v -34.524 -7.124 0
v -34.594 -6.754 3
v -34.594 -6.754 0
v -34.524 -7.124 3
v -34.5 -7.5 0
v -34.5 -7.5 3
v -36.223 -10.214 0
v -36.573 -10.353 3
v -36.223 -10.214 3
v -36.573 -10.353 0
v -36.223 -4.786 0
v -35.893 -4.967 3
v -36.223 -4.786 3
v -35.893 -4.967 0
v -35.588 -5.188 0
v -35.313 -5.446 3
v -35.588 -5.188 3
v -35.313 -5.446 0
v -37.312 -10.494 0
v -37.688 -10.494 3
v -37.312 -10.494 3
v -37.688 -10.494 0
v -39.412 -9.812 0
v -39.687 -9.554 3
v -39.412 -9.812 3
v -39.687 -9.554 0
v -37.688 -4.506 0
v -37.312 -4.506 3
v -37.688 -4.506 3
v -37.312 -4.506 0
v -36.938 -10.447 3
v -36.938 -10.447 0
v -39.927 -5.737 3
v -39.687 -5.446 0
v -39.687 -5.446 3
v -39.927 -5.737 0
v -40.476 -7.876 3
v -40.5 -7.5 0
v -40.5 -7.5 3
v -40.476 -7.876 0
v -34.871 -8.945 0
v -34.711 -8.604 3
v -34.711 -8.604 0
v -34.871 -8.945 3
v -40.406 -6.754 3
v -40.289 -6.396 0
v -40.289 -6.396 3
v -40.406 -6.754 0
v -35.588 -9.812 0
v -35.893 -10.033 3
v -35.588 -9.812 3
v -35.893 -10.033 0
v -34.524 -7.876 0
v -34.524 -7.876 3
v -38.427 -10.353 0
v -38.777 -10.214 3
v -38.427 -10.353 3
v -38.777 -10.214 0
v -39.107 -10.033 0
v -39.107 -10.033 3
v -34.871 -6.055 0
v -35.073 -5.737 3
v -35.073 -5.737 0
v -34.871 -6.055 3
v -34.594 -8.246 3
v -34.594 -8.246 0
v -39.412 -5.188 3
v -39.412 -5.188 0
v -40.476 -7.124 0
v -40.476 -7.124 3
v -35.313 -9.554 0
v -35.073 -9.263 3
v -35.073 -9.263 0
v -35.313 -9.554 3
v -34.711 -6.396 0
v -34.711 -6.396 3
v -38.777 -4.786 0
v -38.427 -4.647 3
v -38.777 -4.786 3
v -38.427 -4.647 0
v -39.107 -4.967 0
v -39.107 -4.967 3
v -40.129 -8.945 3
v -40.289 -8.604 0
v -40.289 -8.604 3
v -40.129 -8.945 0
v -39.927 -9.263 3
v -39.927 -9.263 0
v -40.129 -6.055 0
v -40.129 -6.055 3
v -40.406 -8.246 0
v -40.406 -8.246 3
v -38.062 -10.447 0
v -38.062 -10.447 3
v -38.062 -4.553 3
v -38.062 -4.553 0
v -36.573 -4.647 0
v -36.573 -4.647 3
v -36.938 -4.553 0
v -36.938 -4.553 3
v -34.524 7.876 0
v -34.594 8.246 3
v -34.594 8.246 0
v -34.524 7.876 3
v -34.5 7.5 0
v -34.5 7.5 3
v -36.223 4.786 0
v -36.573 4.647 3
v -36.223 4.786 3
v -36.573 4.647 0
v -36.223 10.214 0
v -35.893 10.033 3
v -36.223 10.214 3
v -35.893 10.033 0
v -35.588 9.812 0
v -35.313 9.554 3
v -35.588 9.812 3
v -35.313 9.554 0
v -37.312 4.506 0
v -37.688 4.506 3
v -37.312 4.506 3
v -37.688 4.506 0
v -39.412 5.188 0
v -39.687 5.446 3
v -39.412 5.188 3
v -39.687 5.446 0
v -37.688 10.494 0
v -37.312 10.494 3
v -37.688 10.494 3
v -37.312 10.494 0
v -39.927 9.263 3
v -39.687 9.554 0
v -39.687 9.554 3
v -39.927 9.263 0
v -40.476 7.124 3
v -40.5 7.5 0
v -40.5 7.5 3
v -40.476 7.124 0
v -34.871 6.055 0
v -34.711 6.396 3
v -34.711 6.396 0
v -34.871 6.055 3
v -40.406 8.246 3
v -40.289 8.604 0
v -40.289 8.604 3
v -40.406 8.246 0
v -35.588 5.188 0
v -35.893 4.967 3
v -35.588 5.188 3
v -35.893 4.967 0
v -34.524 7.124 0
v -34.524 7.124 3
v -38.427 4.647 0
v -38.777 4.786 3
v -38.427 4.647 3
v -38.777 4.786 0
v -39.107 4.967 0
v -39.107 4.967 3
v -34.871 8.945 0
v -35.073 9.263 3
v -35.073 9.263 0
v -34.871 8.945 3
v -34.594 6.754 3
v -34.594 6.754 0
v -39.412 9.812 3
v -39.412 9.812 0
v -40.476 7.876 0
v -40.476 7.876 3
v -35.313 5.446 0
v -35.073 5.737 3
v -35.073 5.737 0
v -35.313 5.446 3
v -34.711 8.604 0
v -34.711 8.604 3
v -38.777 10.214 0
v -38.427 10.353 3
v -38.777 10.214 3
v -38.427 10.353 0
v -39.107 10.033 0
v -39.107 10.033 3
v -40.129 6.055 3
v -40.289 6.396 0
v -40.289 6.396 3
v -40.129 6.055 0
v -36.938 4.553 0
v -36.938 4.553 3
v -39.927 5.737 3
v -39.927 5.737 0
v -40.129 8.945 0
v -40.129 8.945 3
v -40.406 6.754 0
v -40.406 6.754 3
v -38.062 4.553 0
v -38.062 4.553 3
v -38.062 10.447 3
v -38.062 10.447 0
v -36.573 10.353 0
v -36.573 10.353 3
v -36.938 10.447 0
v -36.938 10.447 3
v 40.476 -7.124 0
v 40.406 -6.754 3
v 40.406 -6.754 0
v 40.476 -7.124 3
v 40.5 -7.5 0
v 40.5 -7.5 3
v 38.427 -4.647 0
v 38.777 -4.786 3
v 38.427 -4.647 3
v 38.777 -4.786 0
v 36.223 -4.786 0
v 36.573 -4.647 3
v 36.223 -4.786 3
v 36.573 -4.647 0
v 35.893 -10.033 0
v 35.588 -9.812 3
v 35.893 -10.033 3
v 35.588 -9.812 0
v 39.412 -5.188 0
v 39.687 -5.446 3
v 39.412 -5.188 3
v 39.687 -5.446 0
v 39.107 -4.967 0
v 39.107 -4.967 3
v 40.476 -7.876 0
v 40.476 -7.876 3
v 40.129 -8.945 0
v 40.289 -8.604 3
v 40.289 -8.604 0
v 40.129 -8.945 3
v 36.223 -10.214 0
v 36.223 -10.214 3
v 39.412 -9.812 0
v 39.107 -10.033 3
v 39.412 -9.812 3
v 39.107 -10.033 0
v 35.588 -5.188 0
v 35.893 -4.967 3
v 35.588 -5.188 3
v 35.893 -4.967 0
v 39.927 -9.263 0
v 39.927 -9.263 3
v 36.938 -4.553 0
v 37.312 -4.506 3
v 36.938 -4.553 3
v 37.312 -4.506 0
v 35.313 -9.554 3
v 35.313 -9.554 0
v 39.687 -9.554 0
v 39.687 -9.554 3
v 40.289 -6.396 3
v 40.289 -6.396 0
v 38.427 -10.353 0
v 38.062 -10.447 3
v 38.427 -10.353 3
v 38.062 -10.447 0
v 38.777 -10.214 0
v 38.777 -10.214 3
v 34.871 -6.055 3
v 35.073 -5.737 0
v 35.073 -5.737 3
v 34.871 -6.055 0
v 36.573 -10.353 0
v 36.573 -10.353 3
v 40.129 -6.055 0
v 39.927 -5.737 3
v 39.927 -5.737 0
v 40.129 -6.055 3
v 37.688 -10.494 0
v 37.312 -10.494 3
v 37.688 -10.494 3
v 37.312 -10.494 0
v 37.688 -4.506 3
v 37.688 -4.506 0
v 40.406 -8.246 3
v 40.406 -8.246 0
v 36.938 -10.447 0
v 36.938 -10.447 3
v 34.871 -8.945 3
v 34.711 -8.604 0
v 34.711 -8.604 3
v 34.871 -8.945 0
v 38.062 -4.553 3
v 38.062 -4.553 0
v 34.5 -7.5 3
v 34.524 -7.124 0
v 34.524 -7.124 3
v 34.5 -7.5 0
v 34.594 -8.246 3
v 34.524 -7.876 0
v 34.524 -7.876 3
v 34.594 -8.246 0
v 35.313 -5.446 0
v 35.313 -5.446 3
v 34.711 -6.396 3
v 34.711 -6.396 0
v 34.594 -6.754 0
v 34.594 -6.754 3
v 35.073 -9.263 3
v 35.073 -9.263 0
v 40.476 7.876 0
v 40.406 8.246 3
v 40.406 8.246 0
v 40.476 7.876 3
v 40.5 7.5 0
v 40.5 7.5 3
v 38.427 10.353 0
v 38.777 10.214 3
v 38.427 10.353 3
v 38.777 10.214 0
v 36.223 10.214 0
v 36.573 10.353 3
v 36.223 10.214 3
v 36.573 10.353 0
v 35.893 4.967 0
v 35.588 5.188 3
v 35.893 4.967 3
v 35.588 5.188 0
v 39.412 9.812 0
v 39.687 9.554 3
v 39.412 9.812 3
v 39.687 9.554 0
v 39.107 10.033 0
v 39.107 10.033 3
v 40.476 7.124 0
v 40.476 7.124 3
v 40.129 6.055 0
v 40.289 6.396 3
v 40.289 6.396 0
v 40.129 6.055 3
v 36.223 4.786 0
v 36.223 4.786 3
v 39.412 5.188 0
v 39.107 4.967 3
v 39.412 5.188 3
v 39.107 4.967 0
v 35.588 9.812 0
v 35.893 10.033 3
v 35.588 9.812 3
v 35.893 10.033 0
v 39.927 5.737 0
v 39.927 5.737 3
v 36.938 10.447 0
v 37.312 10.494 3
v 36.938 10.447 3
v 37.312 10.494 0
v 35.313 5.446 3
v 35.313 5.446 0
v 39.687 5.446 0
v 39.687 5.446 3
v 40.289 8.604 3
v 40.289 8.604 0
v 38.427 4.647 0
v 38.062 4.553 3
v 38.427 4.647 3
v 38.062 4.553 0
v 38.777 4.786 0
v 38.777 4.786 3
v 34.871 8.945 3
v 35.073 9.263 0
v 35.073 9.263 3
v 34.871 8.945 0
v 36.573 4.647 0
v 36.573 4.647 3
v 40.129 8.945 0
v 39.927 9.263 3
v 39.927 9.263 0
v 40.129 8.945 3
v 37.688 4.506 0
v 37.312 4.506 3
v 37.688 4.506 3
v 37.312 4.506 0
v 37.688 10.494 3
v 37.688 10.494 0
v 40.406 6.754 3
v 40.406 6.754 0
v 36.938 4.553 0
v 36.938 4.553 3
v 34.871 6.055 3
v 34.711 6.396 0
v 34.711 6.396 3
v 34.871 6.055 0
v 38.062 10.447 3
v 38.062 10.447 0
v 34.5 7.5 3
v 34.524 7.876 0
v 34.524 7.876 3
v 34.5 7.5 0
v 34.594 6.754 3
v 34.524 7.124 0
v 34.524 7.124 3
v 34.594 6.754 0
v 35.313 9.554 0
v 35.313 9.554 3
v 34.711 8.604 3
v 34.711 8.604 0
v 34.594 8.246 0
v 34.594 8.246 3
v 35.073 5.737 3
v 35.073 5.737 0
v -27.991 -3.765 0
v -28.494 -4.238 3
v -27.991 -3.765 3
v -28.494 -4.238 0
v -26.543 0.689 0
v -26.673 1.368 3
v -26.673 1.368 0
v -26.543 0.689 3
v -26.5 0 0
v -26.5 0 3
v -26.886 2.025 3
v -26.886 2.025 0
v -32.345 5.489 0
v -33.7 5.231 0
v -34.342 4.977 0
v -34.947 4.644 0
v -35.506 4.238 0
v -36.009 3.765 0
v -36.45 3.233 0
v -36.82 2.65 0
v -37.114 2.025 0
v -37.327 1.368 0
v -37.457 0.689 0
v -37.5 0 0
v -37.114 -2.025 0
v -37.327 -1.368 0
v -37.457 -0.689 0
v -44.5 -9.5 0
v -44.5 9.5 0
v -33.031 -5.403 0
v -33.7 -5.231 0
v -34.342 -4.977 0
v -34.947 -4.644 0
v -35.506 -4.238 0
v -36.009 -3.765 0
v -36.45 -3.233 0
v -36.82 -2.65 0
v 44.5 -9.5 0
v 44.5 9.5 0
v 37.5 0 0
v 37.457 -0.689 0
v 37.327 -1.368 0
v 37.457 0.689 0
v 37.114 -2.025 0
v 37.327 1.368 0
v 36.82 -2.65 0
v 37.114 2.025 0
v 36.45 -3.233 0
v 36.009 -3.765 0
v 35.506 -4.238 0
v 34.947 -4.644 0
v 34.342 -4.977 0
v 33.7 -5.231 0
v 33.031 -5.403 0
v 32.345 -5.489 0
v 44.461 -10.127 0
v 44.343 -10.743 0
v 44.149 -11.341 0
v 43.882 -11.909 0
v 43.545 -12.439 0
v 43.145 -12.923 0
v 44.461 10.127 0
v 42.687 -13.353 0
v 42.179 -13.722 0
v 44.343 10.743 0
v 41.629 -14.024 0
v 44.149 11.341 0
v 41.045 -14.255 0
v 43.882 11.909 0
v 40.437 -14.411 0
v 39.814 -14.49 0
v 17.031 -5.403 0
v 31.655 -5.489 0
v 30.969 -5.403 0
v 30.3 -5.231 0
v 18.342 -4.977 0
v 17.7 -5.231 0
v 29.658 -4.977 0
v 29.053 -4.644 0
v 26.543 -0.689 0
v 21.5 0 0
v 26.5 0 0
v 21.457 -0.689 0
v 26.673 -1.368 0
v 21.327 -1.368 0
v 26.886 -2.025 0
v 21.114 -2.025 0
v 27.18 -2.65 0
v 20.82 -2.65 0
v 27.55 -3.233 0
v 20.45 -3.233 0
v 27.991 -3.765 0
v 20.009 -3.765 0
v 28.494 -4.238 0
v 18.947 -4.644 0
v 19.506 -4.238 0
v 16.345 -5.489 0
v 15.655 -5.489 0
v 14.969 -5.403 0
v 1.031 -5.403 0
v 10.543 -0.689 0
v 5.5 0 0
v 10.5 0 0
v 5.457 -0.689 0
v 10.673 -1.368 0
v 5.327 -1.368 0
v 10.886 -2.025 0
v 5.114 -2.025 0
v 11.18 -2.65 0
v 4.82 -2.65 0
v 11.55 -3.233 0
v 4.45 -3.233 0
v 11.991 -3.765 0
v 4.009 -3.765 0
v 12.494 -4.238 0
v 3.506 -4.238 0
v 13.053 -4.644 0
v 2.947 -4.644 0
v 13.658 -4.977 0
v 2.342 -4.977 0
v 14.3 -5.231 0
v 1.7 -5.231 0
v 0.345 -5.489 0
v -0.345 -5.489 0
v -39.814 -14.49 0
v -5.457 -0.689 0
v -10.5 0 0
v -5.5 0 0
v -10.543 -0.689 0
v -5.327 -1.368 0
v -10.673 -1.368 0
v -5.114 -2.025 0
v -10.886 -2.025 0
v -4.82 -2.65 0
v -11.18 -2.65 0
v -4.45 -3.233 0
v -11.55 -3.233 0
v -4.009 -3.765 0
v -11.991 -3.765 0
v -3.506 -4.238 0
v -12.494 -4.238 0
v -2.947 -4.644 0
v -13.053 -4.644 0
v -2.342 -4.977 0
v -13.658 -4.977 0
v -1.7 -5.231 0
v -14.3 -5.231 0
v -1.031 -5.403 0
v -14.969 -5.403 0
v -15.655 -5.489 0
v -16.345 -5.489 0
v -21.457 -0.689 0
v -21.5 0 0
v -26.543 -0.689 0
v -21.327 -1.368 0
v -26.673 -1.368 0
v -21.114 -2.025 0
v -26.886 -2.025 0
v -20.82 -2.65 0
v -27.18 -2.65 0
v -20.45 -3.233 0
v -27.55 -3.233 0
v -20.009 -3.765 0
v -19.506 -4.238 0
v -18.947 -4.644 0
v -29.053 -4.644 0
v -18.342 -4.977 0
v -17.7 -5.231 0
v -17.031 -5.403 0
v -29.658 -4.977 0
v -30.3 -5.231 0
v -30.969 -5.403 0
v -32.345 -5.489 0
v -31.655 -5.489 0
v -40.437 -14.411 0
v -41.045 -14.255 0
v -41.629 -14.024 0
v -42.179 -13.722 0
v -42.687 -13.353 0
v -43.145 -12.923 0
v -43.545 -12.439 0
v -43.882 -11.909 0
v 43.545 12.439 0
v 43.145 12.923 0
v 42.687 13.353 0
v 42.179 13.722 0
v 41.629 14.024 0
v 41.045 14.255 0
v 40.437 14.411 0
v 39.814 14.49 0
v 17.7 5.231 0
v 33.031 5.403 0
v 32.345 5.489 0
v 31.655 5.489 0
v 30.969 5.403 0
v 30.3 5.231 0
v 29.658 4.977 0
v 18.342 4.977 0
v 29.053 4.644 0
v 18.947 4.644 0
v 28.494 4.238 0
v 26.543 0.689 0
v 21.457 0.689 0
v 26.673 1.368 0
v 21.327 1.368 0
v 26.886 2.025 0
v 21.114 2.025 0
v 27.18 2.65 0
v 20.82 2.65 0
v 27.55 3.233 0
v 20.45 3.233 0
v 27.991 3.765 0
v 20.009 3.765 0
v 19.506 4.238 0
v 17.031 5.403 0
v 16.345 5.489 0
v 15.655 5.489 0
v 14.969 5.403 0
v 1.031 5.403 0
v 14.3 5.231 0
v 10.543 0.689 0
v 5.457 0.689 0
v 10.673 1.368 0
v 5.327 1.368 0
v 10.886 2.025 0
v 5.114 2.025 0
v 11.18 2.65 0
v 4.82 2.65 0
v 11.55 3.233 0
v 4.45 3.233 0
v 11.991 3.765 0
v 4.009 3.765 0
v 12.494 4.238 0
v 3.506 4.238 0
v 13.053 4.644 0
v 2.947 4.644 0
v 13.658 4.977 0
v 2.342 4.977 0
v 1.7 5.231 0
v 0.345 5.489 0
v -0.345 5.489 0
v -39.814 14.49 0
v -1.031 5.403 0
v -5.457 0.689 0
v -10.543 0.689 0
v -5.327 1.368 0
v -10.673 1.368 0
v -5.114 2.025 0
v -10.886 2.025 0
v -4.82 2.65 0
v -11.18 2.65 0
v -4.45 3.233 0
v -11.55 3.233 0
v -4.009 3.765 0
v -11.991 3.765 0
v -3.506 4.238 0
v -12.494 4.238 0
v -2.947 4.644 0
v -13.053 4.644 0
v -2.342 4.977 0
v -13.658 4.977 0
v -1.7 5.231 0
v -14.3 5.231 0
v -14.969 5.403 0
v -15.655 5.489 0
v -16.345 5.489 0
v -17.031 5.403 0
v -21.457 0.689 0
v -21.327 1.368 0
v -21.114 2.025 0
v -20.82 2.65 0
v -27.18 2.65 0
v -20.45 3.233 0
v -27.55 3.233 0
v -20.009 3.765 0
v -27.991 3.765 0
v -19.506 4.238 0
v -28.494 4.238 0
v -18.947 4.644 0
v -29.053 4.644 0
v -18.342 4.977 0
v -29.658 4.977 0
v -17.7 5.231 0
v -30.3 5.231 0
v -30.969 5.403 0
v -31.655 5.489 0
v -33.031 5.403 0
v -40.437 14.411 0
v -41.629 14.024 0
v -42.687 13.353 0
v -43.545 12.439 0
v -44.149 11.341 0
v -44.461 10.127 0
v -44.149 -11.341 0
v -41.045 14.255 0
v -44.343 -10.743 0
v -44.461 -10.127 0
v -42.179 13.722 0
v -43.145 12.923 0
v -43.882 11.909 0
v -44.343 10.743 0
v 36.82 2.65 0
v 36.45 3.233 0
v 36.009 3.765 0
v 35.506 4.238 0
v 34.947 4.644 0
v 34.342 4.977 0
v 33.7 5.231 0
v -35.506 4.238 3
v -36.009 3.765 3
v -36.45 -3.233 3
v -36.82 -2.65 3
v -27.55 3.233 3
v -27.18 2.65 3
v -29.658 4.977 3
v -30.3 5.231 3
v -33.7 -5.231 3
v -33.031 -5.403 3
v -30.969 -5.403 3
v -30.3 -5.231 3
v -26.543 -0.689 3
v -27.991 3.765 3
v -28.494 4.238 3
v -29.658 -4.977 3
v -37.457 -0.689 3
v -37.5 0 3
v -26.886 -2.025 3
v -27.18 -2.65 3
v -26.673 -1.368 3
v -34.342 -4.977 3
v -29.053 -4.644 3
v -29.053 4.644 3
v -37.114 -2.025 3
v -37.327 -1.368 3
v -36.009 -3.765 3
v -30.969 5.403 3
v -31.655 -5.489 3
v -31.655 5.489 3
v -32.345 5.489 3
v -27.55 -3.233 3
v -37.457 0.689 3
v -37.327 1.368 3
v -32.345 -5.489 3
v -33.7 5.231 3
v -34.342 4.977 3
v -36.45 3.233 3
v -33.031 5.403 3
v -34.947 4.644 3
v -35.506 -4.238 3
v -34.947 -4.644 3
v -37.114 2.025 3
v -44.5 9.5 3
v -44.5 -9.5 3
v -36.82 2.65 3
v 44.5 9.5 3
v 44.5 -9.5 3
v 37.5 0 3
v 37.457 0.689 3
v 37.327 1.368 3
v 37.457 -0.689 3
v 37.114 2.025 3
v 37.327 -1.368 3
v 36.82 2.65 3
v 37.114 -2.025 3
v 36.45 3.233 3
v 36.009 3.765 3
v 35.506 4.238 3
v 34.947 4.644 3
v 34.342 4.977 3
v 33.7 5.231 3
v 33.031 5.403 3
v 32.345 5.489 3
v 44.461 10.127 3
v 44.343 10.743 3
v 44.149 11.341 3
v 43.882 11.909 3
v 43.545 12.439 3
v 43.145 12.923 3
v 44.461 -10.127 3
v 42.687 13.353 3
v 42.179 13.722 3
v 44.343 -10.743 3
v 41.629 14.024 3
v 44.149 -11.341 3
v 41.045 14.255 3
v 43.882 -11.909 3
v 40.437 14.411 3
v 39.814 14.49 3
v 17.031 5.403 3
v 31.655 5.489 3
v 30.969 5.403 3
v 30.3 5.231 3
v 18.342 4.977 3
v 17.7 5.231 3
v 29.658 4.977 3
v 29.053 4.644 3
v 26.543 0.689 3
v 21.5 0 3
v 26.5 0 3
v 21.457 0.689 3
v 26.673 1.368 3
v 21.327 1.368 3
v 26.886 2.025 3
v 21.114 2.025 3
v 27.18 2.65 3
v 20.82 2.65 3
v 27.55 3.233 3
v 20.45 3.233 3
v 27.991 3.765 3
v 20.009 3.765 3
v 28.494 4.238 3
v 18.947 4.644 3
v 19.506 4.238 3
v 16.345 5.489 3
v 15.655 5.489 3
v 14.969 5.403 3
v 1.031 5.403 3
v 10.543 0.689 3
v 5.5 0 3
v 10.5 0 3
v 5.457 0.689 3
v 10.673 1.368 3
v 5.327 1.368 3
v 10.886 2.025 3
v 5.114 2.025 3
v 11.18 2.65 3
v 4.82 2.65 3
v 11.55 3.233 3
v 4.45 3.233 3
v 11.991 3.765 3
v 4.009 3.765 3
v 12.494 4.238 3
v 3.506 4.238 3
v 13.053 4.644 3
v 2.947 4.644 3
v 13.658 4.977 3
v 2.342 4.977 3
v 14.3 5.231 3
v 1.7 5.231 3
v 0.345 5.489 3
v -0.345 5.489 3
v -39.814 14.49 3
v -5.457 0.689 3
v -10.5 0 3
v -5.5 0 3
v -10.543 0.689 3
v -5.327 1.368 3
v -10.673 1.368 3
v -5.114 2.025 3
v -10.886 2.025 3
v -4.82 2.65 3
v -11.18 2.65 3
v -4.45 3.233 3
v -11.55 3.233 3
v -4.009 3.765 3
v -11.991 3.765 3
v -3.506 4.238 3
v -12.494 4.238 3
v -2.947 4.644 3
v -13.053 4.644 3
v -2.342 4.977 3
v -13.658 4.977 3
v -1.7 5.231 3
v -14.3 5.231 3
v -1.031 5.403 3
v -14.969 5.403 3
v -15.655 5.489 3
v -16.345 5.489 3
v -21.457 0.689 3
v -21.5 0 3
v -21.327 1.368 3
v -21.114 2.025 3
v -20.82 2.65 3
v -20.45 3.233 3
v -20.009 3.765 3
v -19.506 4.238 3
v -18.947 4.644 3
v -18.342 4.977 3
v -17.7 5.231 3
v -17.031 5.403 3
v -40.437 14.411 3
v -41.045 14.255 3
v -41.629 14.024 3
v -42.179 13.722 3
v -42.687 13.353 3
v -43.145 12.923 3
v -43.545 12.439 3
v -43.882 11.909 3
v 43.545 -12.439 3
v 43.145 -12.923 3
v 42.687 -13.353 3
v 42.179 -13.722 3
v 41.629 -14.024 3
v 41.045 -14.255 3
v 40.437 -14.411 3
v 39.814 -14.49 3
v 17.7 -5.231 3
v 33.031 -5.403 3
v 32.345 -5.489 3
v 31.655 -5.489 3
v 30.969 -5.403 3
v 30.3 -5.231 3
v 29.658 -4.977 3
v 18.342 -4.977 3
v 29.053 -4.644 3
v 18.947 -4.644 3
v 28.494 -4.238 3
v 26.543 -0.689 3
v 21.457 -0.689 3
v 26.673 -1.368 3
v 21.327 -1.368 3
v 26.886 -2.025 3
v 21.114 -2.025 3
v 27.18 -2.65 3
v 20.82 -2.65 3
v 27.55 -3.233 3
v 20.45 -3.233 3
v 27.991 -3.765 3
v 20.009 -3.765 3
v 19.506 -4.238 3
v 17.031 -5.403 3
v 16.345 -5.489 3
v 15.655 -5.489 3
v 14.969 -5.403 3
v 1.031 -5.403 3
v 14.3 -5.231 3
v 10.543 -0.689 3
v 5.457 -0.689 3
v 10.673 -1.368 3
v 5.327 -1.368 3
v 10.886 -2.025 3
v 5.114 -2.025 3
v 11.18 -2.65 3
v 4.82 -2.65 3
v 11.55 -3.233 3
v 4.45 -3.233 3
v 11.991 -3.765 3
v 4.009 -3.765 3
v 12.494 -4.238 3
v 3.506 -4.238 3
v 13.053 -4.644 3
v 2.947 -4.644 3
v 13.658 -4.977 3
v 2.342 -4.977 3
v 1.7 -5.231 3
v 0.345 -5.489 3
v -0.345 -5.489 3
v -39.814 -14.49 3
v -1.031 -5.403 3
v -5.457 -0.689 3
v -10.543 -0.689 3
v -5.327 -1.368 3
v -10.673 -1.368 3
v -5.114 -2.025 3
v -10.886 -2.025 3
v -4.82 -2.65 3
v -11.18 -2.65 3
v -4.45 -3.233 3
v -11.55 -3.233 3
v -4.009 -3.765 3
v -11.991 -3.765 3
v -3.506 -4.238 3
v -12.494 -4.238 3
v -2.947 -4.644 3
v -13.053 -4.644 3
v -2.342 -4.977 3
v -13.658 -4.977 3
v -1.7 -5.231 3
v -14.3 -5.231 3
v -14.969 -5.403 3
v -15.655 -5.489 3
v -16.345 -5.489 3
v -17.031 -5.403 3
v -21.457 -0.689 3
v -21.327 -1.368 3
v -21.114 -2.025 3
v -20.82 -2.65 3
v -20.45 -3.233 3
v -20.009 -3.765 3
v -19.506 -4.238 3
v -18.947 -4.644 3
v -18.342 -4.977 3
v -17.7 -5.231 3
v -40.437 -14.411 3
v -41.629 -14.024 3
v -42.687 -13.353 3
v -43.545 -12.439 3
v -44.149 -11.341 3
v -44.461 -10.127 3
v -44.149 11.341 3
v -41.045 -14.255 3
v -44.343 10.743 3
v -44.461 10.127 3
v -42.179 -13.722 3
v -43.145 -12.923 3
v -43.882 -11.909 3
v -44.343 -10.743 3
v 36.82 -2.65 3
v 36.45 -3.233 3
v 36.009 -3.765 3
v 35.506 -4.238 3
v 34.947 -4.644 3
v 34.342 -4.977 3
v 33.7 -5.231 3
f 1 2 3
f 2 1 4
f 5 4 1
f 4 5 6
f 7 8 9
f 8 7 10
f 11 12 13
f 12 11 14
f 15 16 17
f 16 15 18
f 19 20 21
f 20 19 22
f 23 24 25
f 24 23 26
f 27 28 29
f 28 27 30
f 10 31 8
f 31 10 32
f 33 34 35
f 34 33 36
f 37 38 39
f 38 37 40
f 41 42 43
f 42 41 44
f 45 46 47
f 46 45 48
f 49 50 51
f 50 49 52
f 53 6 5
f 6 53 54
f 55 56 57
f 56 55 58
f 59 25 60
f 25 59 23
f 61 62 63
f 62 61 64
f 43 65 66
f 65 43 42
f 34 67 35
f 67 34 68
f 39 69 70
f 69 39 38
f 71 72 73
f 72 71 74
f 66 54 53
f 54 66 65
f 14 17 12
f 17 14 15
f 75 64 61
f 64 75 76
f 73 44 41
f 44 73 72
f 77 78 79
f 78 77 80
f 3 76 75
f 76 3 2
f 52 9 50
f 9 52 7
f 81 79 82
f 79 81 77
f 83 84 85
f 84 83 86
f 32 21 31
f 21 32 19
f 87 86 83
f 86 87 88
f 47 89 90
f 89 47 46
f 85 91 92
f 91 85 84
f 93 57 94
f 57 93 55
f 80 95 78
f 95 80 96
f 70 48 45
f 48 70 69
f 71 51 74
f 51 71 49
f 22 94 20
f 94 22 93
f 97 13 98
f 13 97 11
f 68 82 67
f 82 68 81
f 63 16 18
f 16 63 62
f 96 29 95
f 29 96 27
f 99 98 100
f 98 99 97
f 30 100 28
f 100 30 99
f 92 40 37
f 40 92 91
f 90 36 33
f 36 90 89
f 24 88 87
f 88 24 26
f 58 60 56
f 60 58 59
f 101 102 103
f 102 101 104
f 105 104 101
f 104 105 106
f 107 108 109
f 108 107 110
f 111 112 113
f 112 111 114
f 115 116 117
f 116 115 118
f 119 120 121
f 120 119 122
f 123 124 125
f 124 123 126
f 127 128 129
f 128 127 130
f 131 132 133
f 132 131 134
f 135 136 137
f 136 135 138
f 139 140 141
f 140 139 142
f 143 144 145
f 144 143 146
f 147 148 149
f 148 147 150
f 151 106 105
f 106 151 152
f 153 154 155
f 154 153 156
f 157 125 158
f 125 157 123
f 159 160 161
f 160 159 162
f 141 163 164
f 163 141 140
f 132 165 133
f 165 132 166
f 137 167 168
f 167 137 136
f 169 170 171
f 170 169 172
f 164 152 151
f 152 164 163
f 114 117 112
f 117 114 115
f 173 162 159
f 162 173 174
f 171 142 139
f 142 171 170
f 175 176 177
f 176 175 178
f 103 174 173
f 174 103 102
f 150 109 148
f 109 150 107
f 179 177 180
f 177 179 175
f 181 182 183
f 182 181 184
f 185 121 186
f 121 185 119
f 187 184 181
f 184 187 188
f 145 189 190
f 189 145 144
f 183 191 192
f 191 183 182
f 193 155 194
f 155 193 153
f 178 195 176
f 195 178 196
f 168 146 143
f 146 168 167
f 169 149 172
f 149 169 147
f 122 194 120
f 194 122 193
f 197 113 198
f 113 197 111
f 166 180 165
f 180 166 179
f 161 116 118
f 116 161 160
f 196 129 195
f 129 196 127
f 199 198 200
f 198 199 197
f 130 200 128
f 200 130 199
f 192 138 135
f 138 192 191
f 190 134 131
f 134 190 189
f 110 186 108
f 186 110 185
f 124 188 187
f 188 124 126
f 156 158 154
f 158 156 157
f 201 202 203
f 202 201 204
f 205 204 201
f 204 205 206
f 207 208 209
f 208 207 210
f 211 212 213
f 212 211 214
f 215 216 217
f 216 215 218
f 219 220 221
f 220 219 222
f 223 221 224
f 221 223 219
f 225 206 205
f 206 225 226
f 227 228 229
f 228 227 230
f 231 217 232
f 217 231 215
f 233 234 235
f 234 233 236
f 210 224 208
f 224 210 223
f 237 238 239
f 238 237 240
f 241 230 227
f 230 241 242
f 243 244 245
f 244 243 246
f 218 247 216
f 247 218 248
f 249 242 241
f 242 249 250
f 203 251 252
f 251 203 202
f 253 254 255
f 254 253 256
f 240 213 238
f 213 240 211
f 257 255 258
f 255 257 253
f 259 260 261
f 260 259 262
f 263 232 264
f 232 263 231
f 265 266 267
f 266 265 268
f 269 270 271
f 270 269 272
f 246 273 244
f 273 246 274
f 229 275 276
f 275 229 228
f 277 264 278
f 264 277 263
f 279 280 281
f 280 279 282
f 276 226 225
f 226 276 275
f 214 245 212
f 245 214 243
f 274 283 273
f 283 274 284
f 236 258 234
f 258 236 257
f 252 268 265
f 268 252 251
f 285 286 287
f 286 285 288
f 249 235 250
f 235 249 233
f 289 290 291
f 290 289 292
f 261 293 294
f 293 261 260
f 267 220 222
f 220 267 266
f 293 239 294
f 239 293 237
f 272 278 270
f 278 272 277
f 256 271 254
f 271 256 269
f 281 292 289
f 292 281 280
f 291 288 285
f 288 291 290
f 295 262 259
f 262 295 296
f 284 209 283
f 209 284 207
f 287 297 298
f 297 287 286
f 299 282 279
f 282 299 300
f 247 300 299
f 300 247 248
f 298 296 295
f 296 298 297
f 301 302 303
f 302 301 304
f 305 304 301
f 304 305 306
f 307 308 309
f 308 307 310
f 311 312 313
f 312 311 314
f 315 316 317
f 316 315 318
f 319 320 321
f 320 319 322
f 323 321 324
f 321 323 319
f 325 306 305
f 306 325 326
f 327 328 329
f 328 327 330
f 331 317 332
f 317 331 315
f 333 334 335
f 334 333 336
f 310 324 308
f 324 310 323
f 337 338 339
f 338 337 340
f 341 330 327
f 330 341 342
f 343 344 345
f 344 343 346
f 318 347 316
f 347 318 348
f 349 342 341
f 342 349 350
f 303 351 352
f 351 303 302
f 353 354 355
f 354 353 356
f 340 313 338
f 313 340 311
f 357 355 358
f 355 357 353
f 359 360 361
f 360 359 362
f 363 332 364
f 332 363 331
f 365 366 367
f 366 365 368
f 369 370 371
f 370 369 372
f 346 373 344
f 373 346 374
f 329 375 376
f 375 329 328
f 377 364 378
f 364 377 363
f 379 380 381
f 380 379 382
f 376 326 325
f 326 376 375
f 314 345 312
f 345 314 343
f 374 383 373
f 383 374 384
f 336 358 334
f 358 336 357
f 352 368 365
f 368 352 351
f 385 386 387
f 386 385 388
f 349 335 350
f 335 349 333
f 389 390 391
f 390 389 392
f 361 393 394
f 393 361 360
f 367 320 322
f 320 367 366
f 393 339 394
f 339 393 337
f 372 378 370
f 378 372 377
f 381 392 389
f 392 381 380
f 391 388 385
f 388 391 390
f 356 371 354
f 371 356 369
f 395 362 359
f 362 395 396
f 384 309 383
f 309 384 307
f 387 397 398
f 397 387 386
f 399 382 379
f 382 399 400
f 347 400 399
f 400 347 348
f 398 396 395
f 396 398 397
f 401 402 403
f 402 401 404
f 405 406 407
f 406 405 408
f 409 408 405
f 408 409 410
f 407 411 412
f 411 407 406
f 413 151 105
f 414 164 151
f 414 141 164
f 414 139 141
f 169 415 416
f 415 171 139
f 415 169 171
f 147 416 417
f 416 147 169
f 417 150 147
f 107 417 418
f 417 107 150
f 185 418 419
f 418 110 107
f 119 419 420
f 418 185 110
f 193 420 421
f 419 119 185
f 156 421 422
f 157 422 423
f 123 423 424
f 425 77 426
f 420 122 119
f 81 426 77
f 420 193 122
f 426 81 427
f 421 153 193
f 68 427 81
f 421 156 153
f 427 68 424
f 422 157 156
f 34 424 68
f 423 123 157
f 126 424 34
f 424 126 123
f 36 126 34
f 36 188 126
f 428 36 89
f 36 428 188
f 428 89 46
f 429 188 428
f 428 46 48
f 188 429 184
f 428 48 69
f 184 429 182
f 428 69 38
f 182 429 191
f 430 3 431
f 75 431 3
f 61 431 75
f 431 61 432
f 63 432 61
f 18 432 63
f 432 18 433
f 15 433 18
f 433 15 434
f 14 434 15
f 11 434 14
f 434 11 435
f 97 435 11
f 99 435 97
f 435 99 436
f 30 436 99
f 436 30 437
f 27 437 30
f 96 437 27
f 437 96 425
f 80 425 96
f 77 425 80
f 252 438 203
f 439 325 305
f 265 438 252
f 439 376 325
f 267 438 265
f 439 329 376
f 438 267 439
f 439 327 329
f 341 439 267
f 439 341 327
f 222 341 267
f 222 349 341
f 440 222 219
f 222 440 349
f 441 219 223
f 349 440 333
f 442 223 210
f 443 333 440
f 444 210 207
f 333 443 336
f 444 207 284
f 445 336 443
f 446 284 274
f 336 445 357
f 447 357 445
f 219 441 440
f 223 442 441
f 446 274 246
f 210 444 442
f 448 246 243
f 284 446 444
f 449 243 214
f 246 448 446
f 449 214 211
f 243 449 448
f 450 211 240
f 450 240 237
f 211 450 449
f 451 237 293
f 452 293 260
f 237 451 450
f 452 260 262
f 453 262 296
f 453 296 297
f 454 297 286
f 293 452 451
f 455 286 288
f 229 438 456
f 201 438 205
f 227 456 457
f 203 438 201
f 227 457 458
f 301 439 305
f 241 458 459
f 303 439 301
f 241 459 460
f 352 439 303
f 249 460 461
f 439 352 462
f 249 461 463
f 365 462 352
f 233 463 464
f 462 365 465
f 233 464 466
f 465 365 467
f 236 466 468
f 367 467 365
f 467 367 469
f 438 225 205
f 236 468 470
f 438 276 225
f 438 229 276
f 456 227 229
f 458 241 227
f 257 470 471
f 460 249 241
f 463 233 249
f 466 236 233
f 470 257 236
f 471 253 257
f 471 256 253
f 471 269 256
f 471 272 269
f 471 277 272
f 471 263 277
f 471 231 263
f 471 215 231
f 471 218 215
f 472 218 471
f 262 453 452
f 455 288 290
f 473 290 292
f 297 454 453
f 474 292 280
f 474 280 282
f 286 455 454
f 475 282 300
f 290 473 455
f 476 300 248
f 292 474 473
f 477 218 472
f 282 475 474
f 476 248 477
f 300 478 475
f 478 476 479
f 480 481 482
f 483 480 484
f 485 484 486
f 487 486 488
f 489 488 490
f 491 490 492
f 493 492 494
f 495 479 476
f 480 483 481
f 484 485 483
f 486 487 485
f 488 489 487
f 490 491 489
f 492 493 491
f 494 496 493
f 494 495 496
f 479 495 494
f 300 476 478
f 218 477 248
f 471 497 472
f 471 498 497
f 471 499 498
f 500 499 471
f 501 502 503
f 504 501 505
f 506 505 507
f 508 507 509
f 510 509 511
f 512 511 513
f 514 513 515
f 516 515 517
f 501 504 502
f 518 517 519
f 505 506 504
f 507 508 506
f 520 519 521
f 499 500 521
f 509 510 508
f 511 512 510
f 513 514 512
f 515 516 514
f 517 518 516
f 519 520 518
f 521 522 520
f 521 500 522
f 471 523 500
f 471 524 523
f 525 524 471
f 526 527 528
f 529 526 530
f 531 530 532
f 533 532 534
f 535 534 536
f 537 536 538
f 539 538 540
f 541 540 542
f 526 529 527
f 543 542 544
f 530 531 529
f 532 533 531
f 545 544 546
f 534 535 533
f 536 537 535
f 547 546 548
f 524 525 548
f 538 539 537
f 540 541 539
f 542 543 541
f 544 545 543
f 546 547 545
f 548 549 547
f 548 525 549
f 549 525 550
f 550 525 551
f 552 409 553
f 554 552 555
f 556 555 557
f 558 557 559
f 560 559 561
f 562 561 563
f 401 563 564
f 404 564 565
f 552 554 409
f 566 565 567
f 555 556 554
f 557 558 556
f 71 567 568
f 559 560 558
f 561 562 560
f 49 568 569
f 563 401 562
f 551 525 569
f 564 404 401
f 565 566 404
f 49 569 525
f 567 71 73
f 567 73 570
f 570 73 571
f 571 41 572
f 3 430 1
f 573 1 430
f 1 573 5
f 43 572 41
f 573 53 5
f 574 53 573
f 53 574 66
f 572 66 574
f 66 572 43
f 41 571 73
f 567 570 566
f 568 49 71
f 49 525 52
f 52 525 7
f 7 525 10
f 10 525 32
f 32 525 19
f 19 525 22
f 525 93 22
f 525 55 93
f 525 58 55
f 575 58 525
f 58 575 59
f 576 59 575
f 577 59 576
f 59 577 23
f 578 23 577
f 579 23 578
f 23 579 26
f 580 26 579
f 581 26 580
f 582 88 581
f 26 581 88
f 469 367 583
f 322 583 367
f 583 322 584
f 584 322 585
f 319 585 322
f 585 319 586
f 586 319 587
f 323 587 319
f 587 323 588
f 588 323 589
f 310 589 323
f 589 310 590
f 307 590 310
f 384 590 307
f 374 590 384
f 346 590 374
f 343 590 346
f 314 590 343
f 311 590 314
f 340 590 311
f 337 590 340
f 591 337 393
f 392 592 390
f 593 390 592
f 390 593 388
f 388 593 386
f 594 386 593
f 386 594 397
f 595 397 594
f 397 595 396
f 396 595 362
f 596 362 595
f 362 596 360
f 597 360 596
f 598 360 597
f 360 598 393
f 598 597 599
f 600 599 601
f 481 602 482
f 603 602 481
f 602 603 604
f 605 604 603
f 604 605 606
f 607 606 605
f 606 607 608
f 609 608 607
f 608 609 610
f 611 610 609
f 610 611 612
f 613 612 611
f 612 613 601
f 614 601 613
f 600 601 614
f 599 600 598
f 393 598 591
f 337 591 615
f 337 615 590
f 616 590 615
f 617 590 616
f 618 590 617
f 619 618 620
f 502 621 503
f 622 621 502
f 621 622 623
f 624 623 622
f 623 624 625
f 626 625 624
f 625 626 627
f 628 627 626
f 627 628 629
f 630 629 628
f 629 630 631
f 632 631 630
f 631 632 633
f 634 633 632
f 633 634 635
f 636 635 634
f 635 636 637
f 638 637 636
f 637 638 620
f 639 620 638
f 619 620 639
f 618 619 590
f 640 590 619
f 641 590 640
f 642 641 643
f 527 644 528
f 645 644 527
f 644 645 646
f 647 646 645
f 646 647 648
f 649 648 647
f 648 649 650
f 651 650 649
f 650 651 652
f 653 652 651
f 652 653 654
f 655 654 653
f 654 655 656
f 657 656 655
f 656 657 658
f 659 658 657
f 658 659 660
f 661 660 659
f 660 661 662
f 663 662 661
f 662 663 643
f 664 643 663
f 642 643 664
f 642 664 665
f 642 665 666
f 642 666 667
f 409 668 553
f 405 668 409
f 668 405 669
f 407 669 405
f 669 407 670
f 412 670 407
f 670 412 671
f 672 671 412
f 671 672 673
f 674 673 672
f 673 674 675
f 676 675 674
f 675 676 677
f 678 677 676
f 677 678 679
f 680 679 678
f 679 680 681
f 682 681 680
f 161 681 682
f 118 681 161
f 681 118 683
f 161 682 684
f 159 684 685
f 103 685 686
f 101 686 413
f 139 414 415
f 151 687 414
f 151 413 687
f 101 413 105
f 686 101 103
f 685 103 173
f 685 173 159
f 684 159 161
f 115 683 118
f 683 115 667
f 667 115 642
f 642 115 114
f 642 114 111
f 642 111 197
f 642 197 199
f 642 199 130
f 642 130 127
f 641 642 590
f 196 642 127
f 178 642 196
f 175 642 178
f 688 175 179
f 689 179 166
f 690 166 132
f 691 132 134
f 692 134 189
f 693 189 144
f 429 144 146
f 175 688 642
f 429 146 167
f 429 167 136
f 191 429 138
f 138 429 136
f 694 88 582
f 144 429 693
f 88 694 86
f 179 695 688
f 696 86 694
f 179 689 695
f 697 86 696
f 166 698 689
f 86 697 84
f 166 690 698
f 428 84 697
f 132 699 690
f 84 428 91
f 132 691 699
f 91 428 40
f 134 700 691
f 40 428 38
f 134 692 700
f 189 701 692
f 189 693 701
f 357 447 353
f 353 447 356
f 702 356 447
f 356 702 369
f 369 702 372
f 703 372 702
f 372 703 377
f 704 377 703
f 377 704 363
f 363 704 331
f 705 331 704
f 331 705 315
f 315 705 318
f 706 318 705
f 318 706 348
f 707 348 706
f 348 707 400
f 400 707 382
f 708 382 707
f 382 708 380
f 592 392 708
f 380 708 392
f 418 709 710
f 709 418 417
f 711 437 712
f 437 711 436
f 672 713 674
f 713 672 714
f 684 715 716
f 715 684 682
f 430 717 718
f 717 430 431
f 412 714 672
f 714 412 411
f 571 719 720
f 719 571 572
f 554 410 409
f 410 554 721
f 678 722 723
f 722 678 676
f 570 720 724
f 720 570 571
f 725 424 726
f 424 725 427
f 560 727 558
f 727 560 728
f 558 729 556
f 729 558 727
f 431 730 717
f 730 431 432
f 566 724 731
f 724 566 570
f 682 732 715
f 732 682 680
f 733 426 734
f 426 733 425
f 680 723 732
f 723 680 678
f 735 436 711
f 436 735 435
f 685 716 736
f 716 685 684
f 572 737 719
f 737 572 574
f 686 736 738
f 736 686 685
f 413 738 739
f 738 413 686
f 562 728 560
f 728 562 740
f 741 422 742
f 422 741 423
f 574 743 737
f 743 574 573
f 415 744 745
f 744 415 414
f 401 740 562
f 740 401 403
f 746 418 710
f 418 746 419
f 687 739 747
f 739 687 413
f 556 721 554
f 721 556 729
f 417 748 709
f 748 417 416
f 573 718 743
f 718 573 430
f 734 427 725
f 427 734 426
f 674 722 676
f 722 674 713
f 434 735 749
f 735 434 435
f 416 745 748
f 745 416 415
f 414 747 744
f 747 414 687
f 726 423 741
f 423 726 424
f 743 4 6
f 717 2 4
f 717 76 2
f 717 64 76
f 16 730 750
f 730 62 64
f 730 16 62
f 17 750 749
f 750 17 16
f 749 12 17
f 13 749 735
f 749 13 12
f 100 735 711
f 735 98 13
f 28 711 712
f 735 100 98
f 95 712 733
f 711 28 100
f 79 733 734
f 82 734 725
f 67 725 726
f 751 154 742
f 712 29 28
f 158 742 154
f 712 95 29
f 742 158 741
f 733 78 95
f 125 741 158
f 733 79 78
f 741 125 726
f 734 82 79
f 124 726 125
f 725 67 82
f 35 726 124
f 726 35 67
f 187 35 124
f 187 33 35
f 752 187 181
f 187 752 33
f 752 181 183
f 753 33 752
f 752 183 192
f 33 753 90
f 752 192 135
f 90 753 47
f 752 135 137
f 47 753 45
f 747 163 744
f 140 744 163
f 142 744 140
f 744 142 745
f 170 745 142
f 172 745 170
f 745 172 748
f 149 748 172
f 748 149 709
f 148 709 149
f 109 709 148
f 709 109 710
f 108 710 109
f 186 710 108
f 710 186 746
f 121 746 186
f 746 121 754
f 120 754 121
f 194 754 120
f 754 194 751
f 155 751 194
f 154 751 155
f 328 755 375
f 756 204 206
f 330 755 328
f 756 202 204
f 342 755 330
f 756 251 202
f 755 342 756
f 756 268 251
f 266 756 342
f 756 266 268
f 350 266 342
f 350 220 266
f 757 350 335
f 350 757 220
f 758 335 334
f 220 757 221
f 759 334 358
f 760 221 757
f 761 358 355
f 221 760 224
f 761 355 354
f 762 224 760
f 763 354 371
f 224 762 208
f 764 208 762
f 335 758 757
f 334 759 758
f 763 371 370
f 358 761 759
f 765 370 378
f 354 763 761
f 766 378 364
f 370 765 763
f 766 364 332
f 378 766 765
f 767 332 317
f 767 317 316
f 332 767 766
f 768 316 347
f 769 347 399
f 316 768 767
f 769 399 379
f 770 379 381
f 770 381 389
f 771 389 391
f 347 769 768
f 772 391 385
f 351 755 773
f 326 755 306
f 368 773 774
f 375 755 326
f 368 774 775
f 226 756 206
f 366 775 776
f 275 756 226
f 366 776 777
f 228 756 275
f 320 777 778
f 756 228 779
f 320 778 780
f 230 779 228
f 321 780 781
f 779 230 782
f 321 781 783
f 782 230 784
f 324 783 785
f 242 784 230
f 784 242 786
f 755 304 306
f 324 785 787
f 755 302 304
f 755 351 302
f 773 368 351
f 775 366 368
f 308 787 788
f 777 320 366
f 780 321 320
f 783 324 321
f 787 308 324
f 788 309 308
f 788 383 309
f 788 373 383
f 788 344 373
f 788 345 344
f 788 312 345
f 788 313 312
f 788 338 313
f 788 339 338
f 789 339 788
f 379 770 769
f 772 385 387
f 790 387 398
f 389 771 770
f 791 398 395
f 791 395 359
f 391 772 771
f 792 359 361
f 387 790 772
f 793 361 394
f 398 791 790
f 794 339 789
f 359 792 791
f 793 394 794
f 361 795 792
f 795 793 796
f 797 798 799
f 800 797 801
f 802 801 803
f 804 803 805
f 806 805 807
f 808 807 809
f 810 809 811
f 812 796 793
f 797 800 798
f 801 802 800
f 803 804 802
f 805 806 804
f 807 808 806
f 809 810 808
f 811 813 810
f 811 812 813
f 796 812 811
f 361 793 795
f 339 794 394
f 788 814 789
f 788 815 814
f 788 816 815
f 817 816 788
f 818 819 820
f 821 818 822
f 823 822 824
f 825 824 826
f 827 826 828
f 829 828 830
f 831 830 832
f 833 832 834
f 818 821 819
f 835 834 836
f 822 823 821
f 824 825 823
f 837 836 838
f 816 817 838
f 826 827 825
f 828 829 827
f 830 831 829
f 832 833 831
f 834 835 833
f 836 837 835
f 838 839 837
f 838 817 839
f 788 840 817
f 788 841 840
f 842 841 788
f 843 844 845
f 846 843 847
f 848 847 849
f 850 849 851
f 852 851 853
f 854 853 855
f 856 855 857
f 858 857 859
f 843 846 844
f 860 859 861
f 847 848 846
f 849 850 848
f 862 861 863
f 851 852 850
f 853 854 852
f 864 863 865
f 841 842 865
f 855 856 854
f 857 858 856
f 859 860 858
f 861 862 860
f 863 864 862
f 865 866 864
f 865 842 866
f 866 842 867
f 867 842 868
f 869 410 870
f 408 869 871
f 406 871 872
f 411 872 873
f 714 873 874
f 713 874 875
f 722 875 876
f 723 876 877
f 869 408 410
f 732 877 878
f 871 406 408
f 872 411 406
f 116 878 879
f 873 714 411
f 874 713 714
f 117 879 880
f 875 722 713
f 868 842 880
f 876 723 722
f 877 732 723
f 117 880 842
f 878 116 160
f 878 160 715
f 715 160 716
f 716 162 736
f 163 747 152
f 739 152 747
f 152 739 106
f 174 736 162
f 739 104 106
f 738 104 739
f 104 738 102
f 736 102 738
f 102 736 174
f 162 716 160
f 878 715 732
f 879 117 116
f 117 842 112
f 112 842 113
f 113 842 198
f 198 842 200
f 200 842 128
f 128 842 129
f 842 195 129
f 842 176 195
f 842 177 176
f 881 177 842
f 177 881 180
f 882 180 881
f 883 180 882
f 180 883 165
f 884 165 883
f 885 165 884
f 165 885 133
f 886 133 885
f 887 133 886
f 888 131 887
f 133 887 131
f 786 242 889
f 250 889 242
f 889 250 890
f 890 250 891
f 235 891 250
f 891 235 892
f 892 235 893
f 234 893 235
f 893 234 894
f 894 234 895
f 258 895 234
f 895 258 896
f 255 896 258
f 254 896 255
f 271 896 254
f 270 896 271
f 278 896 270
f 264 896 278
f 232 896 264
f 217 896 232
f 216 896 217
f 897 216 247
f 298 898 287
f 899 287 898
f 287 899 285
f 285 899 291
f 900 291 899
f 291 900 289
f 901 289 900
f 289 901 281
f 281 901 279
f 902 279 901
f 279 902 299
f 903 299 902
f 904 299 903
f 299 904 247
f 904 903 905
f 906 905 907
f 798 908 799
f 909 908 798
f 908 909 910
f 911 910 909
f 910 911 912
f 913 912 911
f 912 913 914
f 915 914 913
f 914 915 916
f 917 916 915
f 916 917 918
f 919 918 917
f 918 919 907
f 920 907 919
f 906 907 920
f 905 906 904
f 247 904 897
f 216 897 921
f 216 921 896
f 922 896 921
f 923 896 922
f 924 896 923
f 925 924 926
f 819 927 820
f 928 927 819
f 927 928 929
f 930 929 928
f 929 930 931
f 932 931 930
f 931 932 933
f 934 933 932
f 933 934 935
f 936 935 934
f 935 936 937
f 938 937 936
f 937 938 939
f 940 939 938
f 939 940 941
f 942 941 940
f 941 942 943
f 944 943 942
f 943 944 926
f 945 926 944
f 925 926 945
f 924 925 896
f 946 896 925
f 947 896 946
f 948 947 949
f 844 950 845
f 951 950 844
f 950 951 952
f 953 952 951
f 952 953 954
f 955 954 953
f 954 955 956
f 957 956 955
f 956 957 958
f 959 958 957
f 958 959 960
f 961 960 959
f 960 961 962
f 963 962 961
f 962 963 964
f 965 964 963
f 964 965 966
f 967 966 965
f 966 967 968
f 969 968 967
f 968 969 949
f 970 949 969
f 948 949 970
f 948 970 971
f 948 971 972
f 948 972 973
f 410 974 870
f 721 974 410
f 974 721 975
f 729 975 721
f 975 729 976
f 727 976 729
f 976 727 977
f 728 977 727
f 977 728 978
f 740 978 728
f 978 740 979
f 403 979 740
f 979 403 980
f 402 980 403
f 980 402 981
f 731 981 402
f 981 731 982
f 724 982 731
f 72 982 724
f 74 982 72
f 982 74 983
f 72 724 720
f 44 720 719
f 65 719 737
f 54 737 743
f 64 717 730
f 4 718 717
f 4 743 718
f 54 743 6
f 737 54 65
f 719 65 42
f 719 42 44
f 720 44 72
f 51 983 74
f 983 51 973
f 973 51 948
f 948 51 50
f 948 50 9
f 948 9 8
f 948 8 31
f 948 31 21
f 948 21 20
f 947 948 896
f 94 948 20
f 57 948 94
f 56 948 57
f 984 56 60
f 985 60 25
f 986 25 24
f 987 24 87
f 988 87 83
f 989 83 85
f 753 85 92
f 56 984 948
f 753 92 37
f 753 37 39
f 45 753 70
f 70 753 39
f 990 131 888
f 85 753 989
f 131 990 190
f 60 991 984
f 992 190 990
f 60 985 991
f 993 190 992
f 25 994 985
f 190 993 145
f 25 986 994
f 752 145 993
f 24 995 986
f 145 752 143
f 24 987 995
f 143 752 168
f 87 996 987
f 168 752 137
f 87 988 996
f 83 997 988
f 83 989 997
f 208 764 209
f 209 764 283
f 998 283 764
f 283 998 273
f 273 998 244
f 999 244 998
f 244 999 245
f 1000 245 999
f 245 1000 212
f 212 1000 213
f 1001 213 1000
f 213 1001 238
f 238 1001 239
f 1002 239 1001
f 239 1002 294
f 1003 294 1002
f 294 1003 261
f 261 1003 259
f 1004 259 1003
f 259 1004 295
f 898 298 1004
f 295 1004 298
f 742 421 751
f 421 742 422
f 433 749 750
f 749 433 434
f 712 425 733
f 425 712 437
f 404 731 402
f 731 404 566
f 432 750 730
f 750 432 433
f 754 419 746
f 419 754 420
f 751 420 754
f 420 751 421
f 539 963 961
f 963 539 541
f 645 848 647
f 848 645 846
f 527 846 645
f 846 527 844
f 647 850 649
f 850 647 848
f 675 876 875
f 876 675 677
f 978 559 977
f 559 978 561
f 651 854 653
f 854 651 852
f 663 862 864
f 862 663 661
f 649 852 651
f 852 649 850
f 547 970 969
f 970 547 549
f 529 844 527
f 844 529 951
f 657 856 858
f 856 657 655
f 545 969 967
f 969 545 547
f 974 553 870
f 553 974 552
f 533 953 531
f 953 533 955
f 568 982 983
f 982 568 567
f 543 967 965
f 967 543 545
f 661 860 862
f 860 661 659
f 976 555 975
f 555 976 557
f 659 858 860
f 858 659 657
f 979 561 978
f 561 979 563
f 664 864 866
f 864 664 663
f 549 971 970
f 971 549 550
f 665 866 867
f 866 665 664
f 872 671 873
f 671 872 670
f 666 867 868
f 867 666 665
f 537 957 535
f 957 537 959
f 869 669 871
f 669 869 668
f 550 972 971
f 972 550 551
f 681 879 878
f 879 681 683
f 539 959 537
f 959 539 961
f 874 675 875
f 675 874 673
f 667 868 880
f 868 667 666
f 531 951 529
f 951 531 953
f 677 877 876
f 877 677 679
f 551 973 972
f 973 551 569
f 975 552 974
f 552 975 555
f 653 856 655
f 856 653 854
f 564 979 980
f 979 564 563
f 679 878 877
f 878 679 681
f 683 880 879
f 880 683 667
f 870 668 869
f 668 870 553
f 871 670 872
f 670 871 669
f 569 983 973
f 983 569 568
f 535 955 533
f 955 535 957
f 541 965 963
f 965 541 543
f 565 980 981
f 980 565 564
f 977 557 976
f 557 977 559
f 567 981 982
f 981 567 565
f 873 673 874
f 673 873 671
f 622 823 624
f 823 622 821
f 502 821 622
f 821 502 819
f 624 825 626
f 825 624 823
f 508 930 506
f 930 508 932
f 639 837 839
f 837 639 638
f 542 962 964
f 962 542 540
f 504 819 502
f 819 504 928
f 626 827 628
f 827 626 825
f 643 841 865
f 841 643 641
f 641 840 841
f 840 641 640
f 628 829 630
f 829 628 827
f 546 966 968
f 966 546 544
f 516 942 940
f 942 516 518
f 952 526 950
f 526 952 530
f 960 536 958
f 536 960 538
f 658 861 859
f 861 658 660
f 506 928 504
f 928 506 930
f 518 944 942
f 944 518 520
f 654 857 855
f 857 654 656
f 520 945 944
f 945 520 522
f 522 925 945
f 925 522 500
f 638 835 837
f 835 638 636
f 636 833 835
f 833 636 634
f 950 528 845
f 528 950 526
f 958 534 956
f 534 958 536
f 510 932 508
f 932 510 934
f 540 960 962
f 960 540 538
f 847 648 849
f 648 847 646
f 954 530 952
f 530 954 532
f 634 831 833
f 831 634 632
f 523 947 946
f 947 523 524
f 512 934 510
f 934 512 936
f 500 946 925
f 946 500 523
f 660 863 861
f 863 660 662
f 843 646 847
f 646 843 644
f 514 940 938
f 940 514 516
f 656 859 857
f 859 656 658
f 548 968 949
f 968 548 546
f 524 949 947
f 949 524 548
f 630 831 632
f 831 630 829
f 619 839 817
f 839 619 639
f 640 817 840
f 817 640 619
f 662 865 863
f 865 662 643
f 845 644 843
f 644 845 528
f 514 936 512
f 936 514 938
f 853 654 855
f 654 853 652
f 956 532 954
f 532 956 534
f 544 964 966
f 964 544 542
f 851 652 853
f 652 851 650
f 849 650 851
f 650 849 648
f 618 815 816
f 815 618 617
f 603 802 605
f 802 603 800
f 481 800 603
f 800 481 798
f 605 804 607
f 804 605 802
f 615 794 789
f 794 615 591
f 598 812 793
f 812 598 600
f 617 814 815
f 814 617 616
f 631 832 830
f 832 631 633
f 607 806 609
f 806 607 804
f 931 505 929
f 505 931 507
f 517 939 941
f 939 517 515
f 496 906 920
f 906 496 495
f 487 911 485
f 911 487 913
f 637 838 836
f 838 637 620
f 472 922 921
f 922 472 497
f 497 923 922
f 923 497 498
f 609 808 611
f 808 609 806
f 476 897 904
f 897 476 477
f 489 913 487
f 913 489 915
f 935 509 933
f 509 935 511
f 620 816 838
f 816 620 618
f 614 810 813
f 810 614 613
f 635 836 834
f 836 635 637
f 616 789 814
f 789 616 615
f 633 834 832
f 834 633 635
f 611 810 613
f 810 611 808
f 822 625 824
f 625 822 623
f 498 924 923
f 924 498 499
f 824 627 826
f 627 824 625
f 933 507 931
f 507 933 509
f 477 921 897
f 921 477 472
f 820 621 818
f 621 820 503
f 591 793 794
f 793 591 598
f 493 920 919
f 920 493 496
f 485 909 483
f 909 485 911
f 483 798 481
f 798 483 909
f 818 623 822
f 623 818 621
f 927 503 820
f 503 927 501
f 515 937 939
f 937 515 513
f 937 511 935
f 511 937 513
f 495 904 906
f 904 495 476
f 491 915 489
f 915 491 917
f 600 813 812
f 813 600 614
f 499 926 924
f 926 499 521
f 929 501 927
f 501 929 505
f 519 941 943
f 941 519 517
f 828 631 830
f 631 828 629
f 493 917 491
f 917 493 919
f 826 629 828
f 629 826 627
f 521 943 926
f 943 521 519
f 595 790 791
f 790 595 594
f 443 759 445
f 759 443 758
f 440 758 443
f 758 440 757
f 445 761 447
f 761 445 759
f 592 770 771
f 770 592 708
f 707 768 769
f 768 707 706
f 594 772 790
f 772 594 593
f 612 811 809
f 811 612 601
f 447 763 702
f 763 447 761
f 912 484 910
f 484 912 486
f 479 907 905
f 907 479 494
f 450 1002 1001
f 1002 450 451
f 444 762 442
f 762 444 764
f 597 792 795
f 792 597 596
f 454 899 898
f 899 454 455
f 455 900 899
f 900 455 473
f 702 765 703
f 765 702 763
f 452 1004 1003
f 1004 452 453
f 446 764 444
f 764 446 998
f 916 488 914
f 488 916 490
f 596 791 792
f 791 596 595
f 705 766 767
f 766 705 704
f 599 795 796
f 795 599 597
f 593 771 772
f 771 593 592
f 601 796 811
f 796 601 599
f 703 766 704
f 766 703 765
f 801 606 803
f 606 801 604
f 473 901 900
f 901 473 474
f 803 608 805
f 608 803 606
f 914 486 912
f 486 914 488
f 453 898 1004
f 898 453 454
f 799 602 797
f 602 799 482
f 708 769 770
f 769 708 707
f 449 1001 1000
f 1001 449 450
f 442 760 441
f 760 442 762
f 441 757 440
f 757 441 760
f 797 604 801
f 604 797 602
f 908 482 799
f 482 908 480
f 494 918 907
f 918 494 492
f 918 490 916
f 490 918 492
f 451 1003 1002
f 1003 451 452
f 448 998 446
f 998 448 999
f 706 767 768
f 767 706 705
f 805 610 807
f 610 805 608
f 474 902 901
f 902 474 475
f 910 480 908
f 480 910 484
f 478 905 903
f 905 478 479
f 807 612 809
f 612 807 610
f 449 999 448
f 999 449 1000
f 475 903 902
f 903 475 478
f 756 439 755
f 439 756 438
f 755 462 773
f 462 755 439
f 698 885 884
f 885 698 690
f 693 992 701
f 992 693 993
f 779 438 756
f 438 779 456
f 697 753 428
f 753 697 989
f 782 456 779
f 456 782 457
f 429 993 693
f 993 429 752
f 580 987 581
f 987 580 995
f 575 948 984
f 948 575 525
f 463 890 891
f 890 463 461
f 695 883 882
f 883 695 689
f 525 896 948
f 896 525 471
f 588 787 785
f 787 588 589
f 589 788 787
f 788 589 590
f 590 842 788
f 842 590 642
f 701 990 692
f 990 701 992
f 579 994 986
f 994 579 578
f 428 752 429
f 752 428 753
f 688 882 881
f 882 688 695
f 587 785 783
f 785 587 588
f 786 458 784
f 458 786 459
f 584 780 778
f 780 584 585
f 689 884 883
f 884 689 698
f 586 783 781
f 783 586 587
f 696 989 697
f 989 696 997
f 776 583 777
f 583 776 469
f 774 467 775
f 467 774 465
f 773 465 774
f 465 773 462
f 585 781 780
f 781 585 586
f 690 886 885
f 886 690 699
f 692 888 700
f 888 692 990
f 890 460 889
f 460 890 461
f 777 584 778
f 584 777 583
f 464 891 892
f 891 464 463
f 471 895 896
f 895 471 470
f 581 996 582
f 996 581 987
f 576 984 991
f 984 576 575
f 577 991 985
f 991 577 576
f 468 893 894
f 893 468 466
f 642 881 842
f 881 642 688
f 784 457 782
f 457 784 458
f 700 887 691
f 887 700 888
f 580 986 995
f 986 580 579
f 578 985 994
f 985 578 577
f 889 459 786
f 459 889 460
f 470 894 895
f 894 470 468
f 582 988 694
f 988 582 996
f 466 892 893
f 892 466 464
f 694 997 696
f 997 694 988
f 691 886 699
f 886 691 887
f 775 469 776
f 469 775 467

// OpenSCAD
$fn = 50;


difference() {
	union() {
		hull() {
			translate(v = [-39.5000000000, 9.5000000000, 0]) {
				cylinder(h = 3, r = 5);
			}
			translate(v = [39.5000000000, 9.5000000000, 0]) {
				cylinder(h = 3, r = 5);
			}
			translate(v = [-39.5000000000, -9.5000000000, 0]) {
				cylinder(h = 3, r = 5);
			}
			translate(v = [39.5000000000, -9.5000000000, 0]) {
				cylinder(h = 3, r = 5);
			}
		}
	}
	union() {
		#translate(v = [-37.5000000000, -7.5000000000, -100.0000000000]) {
			cylinder(h = 200, r = 3.0000000000);
		}
		#translate(v = [-37.5000000000, 7.5000000000, -100.0000000000]) {
			cylinder(h = 200, r = 3.0000000000);
		}
		#translate(v = [37.5000000000, -7.5000000000, -100.0000000000]) {
			cylinder(h = 200, r = 3.0000000000);
		}
		#translate(v = [37.5000000000, 7.5000000000, -100.0000000000]) {
			cylinder(h = 200, r = 3.0000000000);
		}
		#translate(v = [-32.0000000000, 0, 0]) {
			cylinder(h = 3, r = 5.5000000000);
		}
		#translate(v = [-16.0000000000, 0, 0]) {
			cylinder(h = 3, r = 5.5000000000);
		}
		#cylinder(h = 3, r = 5.5000000000);
		#translate(v = [16.0000000000, 0, 0]) {
			cylinder(h = 3, r = 5.5000000000);
		}
		#translate(v = [32.0000000000, 0, 0]) {
			cylinder(h = 3, r = 5.5000000000);
		}
	}
}
